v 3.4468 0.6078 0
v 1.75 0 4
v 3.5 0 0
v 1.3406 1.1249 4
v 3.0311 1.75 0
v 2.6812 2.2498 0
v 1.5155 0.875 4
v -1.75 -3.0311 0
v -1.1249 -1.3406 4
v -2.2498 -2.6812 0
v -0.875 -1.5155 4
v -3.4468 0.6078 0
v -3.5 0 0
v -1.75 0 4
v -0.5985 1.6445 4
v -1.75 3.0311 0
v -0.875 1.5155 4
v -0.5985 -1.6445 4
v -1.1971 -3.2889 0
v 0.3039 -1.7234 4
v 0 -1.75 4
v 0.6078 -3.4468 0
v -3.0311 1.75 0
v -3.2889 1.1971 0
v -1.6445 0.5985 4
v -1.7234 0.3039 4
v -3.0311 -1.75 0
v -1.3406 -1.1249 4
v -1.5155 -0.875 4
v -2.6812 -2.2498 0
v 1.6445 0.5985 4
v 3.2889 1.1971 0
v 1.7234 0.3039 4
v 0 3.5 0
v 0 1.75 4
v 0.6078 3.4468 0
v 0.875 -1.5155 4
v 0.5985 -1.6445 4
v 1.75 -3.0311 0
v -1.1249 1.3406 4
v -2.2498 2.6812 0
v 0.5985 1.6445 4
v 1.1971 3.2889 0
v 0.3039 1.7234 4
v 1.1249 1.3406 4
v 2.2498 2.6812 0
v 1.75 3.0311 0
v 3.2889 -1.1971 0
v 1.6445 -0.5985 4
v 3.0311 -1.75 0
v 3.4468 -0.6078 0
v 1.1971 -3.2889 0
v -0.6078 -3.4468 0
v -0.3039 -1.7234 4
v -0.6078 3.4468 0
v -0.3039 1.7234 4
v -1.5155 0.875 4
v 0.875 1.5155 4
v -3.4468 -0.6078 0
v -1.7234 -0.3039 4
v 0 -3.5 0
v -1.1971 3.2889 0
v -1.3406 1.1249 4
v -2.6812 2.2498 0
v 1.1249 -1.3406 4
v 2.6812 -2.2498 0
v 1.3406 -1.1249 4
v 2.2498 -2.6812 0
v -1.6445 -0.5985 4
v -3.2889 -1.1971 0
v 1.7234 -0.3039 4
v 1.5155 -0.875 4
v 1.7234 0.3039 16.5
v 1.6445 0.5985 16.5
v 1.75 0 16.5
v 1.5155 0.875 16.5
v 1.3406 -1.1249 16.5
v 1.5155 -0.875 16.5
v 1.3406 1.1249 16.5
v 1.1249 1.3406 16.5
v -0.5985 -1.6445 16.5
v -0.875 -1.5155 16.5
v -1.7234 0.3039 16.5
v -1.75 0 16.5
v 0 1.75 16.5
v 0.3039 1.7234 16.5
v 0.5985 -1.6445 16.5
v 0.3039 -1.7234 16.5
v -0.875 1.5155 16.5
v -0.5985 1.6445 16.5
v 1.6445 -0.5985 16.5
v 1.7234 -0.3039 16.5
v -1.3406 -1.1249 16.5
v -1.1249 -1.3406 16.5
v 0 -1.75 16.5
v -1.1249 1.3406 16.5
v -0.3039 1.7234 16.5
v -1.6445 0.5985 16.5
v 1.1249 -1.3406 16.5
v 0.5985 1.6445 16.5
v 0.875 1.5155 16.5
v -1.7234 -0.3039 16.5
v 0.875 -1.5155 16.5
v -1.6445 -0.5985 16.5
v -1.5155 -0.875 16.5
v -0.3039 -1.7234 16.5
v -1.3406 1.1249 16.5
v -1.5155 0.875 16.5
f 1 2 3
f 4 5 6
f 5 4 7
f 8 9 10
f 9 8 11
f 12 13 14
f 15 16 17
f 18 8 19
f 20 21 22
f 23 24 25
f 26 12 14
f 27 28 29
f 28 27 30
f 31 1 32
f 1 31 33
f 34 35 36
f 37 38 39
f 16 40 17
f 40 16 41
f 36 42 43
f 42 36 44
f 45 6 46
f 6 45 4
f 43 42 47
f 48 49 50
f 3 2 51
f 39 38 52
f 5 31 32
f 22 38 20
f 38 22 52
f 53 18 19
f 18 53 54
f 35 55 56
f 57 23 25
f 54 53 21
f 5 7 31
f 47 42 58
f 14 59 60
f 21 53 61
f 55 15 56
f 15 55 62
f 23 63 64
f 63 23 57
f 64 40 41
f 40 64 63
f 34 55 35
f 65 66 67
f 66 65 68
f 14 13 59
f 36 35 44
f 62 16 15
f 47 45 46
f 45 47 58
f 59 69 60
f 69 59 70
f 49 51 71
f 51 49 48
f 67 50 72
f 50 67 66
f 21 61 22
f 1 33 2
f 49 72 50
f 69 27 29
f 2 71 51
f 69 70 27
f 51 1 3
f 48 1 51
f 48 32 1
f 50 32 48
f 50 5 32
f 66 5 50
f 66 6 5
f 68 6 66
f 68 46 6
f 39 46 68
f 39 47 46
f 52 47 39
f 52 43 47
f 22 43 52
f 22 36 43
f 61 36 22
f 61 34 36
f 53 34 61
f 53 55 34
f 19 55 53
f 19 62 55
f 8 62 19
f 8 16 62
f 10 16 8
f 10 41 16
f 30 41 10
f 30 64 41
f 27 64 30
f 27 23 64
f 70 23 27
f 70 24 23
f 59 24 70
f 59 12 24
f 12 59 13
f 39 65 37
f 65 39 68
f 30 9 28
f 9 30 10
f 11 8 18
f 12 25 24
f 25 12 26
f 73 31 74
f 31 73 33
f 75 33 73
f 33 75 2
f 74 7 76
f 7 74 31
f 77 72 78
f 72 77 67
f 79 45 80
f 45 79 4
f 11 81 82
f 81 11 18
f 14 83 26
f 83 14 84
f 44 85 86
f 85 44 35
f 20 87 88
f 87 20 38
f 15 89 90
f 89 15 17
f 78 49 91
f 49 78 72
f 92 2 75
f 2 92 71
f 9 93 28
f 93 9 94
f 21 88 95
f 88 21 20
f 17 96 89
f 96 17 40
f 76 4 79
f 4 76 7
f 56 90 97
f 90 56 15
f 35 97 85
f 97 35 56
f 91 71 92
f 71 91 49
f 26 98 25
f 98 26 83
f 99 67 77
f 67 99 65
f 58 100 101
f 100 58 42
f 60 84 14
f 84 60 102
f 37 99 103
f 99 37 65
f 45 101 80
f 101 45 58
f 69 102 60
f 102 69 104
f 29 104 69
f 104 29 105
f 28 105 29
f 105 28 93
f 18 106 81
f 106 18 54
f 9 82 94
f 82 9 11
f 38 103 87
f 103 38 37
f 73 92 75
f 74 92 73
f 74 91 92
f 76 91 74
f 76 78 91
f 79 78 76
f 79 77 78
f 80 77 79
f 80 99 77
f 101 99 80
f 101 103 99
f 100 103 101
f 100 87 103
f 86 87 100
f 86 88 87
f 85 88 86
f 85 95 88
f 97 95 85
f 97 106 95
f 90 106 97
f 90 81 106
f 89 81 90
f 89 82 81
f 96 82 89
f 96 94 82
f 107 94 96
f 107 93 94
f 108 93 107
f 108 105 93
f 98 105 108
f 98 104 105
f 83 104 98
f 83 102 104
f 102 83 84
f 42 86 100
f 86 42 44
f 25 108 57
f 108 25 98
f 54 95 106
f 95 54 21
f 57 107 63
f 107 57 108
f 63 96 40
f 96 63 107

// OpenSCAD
$fn=36;

//Tickness
t=1.4;

/* Copy from here */

//Schraube oben durchmesser
//sod=5;
sod=7;
//Schraube unten durchmesser
//sud=2;
sud=3.5;
//Schraubenkopflänge
skl=4;
//Schraube Total
st=16.5;
//

module Schraube()
{
    color("red")
    translate([0,0,0])
    rotate([0,0,0])
    {
        cylinder(skl, d1=sod,d2=sud);
        cylinder(st, d=sud);
    }
}

Schraube();
